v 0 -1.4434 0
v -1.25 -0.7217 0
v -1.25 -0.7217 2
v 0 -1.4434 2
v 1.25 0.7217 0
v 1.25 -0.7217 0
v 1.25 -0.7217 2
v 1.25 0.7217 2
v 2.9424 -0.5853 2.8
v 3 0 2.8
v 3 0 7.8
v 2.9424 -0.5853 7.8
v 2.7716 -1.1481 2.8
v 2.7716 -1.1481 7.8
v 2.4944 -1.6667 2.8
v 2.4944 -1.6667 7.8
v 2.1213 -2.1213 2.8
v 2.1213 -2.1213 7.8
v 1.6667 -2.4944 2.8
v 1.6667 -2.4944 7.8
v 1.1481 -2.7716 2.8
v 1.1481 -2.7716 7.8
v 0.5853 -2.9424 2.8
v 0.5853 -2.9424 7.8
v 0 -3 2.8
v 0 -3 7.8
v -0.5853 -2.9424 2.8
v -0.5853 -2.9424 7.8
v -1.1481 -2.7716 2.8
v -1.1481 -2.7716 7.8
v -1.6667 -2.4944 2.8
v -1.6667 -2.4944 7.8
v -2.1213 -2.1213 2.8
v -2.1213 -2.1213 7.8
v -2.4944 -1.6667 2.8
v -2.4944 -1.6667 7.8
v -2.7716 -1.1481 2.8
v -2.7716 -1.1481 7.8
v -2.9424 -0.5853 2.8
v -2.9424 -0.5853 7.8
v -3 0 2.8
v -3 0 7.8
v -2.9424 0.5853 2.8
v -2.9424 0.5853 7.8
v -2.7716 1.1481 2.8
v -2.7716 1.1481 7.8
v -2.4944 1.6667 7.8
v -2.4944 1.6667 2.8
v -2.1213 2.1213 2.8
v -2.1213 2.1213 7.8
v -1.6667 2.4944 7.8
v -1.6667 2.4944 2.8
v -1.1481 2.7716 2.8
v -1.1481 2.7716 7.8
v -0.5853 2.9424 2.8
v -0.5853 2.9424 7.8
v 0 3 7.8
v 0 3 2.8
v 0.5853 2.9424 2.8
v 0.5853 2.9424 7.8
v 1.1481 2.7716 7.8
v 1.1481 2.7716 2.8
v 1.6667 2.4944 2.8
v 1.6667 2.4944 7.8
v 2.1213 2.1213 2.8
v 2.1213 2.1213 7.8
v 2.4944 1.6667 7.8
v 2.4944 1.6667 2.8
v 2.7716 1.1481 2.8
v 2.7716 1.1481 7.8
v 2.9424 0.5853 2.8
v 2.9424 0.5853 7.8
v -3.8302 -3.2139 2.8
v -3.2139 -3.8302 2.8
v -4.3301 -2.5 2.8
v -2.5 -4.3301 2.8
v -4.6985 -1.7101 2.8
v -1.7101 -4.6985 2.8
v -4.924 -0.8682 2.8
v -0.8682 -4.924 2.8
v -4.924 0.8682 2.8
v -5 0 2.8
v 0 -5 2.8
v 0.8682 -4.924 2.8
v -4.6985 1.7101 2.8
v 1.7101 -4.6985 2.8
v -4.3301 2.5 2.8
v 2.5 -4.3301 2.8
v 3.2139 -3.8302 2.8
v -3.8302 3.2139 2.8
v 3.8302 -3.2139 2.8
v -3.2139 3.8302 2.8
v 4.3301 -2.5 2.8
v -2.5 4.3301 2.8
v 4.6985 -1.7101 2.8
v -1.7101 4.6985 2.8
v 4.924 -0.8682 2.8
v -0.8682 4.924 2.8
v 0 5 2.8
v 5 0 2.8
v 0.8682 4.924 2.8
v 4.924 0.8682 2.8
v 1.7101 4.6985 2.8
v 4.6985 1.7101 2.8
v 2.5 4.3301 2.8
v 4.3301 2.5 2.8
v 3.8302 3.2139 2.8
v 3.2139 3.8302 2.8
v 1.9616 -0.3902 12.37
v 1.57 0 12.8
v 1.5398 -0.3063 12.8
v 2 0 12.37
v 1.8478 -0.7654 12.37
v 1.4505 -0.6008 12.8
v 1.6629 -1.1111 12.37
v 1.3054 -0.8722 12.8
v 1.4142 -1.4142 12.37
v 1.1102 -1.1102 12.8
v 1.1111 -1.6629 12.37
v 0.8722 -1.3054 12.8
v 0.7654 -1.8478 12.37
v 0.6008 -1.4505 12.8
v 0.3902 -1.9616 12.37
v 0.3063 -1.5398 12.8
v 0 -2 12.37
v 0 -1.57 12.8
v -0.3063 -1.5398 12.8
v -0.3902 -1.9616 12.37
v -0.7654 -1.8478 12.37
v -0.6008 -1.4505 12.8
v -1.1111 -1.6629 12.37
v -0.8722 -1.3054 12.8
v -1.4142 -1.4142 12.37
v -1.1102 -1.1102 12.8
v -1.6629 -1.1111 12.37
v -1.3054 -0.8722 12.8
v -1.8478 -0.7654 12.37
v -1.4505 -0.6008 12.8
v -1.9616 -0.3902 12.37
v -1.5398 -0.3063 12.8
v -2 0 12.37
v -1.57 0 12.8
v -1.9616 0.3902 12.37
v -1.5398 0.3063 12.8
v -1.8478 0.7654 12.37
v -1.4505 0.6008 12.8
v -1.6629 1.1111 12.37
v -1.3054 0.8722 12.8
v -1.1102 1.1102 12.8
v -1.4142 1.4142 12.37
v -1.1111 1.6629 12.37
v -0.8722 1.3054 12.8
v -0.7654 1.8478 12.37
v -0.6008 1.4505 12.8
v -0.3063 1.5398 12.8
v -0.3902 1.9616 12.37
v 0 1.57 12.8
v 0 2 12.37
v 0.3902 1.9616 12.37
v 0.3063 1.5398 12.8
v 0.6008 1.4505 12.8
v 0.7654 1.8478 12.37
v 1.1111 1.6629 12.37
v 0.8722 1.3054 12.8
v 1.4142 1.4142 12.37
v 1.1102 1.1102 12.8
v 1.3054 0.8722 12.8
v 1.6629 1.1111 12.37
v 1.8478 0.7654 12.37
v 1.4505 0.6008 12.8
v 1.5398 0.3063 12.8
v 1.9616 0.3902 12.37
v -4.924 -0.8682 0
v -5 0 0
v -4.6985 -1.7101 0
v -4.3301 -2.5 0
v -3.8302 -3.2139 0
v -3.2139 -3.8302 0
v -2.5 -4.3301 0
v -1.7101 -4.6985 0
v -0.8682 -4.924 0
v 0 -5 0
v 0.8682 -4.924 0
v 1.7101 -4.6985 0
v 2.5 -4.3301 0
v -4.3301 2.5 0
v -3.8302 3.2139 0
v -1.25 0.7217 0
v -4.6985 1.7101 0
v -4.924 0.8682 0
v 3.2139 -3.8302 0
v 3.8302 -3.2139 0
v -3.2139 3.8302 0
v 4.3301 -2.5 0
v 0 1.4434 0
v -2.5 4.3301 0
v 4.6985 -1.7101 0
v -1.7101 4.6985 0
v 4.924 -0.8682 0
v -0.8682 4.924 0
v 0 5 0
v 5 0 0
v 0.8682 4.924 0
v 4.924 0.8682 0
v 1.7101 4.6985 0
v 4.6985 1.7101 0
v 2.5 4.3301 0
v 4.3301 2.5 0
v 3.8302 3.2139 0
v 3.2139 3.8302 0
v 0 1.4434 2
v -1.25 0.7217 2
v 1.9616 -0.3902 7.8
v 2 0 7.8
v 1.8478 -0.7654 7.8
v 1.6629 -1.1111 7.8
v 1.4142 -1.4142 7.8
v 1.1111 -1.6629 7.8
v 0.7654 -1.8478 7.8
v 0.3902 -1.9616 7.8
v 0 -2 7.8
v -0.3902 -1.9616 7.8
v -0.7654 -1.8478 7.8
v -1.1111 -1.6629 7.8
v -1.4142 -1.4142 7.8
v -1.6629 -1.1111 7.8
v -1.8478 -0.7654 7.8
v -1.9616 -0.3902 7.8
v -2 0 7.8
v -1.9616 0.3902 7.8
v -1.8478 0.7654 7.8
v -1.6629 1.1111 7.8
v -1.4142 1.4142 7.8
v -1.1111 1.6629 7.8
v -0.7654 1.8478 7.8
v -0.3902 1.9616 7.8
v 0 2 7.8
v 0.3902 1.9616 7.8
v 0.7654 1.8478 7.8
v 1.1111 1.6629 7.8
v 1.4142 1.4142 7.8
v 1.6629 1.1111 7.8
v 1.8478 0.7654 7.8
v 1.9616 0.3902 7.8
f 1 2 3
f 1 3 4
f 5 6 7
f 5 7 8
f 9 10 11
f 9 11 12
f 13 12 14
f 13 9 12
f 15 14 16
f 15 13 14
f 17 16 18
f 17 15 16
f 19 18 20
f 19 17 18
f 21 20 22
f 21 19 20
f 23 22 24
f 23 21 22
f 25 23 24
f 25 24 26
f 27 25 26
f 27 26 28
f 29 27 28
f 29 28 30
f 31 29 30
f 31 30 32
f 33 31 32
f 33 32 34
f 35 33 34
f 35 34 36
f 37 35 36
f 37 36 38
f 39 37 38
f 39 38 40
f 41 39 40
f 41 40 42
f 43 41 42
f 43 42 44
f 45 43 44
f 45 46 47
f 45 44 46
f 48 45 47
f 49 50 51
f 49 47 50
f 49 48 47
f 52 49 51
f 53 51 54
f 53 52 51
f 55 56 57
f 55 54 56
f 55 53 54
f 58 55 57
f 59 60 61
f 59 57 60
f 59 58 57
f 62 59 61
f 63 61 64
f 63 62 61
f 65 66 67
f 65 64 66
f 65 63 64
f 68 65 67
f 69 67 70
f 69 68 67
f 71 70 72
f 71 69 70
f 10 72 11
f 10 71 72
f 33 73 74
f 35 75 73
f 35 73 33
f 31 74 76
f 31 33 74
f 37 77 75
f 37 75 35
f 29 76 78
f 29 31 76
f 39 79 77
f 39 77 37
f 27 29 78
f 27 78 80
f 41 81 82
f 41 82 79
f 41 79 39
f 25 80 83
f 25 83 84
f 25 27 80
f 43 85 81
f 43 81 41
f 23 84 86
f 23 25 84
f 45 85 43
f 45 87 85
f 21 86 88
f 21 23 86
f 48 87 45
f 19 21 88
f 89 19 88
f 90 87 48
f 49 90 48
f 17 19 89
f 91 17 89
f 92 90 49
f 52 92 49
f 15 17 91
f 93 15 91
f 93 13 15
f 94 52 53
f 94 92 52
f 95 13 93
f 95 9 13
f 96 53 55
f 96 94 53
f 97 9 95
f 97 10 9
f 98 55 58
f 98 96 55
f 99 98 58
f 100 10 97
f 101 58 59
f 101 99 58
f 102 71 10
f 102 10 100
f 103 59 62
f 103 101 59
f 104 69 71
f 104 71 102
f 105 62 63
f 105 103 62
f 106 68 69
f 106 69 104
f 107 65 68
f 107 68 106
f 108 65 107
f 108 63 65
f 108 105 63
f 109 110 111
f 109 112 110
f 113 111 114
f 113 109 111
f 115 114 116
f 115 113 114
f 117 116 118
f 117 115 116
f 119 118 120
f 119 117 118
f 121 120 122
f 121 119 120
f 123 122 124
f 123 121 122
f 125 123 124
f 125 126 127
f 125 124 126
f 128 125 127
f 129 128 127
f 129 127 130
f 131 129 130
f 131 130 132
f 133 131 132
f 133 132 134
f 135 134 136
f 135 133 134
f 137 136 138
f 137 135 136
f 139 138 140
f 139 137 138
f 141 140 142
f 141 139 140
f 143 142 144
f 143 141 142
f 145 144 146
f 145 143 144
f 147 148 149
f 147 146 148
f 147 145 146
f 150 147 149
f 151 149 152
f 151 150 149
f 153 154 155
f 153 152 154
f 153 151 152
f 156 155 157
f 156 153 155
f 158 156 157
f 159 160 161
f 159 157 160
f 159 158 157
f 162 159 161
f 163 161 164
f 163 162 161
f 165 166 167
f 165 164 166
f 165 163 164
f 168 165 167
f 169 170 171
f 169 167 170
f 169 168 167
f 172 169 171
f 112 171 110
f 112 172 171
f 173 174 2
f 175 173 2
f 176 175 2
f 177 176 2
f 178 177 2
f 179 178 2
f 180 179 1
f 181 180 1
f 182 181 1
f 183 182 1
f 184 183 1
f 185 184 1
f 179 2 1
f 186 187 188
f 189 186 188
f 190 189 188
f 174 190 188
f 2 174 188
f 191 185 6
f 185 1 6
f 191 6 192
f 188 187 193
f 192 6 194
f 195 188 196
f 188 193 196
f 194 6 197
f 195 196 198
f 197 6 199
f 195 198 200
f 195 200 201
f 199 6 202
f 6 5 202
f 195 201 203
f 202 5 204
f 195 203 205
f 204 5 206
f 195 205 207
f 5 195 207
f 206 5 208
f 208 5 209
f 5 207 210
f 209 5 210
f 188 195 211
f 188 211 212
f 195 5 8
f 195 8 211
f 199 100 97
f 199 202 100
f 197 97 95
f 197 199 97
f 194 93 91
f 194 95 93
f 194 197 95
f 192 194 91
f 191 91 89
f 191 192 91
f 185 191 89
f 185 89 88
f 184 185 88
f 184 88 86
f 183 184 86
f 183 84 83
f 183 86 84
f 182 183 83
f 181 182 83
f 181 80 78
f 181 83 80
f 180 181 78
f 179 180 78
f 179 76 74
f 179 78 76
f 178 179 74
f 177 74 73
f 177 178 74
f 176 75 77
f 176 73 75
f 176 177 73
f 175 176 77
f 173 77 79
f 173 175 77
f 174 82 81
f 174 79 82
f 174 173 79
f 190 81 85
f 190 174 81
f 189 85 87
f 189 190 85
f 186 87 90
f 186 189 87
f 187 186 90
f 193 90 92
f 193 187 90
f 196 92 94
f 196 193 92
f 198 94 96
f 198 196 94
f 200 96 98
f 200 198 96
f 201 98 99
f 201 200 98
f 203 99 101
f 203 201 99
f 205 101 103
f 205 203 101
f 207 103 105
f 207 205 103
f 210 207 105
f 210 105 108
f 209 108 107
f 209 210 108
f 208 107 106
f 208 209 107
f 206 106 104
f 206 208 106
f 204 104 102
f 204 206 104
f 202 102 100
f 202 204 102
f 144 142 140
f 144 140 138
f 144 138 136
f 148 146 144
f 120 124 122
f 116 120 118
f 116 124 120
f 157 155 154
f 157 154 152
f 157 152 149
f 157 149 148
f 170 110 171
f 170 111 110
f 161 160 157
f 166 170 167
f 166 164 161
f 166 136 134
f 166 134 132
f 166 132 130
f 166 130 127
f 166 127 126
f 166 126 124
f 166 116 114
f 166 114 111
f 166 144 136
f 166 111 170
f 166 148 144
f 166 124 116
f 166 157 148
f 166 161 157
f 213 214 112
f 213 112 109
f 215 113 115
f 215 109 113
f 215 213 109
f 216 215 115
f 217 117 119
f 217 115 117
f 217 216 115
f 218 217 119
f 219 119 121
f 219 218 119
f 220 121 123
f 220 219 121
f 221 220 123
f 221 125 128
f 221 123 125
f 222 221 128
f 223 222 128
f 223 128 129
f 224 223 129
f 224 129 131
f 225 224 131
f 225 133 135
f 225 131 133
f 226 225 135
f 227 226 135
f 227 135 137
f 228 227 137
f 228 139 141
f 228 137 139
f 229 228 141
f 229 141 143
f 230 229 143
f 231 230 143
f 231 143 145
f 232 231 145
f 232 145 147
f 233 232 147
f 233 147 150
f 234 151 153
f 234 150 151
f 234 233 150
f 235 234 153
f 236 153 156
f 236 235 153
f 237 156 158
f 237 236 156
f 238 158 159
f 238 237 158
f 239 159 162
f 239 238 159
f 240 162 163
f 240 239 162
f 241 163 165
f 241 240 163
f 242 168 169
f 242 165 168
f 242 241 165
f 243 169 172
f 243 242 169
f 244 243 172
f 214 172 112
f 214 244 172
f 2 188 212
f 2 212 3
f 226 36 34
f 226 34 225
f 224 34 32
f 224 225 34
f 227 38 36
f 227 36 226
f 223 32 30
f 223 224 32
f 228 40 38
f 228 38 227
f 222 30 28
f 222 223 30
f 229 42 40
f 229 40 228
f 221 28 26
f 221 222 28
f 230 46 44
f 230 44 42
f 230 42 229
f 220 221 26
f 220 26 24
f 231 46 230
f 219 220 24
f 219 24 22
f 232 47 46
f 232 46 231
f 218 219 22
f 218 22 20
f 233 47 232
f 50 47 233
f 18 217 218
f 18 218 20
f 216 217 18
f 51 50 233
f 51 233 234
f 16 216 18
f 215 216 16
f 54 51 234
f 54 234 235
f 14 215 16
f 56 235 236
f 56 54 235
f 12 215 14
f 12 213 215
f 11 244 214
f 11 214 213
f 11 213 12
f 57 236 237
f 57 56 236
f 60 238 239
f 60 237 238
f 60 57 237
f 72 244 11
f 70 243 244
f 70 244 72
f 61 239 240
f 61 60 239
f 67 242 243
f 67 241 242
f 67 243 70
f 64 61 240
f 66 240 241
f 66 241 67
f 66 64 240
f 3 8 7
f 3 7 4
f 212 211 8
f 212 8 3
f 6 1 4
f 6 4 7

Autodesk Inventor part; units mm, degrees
ref_plane "YZ Plane" through (0, 0, 0) normal (1, 0, 0) x (0, 1, 0)
ref_plane "XZ Plane" through (0, 0, 0) normal (0, 1, 0) x (-1, 0, 0)
ref_plane "XY Plane" through (0, 0, 0) normal (0, 0, 1) x (1, 0, 0)
sketch "Sketch1" plane through (0, 0, 0) normal (0, 1, 0) x (-1, 0, 0)
  line L0 (0, 0) -> (0, 12.8)
  line L1 (0, 12.8) -> (-2, 12.8)
  line L2 (-2, 12.8) -> (-2, 7.8)
  line L3 (-2, 7.8) -> (-3, 7.8)
  line L4 (-3, 7.8) -> (-3, 2.8)
  line L5 (-3, 2.8) -> (-5, 2.8)
  line L6 (-5, 2.8) -> (-5, 0)
  line L7 (-5, 0) -> (0, 0)
  dimension "d0" = 10
  dimension "d1" = 6
  dimension "d2" = 4
  dimension "d3" = 5
  dimension "d4" = 5
  dimension "d5" = 2.8
revolve "Revolution1" add sketch "Sketch1" angle 360 about axis through (0, 0, 0) along (0, 0, 1)
thread "Thread1" size "M4x0.7" class "6g" standard "ANSI Metric M Profile" length 6 offset 1.2
sketch "Sketch2" plane through (0, 0, 0) normal (0, 0, -1) x (-1, 0, 0)
  line L0 (0, 1.4434) -> (1.25, 0.7217)
  line L1 (1.25, 0.7217) -> (1.25, -0.7217)
  line L2 (1.25, -0.7217) -> (0, -1.4434)
  line L3 (0, -1.4434) -> (-1.25, -0.7217)
  line L4 (-1.25, -0.7217) -> (-1.25, 0.7217)
  line L5 (-1.25, 0.7217) -> (0, 1.4434)
  point P0 (0, 0)
  point P1 (0, 0)
  dimension "d9" = 2.5
extrude "Extrusion1" cut sketch "Sketch2" against normal blind 2
chamfer "Chamfer1" distance 0.43 angle 45 1 edges at (-2, 0, 12.8)
properties part number "DBSY4-5-5" material "Stainless Steel AISI 304"
